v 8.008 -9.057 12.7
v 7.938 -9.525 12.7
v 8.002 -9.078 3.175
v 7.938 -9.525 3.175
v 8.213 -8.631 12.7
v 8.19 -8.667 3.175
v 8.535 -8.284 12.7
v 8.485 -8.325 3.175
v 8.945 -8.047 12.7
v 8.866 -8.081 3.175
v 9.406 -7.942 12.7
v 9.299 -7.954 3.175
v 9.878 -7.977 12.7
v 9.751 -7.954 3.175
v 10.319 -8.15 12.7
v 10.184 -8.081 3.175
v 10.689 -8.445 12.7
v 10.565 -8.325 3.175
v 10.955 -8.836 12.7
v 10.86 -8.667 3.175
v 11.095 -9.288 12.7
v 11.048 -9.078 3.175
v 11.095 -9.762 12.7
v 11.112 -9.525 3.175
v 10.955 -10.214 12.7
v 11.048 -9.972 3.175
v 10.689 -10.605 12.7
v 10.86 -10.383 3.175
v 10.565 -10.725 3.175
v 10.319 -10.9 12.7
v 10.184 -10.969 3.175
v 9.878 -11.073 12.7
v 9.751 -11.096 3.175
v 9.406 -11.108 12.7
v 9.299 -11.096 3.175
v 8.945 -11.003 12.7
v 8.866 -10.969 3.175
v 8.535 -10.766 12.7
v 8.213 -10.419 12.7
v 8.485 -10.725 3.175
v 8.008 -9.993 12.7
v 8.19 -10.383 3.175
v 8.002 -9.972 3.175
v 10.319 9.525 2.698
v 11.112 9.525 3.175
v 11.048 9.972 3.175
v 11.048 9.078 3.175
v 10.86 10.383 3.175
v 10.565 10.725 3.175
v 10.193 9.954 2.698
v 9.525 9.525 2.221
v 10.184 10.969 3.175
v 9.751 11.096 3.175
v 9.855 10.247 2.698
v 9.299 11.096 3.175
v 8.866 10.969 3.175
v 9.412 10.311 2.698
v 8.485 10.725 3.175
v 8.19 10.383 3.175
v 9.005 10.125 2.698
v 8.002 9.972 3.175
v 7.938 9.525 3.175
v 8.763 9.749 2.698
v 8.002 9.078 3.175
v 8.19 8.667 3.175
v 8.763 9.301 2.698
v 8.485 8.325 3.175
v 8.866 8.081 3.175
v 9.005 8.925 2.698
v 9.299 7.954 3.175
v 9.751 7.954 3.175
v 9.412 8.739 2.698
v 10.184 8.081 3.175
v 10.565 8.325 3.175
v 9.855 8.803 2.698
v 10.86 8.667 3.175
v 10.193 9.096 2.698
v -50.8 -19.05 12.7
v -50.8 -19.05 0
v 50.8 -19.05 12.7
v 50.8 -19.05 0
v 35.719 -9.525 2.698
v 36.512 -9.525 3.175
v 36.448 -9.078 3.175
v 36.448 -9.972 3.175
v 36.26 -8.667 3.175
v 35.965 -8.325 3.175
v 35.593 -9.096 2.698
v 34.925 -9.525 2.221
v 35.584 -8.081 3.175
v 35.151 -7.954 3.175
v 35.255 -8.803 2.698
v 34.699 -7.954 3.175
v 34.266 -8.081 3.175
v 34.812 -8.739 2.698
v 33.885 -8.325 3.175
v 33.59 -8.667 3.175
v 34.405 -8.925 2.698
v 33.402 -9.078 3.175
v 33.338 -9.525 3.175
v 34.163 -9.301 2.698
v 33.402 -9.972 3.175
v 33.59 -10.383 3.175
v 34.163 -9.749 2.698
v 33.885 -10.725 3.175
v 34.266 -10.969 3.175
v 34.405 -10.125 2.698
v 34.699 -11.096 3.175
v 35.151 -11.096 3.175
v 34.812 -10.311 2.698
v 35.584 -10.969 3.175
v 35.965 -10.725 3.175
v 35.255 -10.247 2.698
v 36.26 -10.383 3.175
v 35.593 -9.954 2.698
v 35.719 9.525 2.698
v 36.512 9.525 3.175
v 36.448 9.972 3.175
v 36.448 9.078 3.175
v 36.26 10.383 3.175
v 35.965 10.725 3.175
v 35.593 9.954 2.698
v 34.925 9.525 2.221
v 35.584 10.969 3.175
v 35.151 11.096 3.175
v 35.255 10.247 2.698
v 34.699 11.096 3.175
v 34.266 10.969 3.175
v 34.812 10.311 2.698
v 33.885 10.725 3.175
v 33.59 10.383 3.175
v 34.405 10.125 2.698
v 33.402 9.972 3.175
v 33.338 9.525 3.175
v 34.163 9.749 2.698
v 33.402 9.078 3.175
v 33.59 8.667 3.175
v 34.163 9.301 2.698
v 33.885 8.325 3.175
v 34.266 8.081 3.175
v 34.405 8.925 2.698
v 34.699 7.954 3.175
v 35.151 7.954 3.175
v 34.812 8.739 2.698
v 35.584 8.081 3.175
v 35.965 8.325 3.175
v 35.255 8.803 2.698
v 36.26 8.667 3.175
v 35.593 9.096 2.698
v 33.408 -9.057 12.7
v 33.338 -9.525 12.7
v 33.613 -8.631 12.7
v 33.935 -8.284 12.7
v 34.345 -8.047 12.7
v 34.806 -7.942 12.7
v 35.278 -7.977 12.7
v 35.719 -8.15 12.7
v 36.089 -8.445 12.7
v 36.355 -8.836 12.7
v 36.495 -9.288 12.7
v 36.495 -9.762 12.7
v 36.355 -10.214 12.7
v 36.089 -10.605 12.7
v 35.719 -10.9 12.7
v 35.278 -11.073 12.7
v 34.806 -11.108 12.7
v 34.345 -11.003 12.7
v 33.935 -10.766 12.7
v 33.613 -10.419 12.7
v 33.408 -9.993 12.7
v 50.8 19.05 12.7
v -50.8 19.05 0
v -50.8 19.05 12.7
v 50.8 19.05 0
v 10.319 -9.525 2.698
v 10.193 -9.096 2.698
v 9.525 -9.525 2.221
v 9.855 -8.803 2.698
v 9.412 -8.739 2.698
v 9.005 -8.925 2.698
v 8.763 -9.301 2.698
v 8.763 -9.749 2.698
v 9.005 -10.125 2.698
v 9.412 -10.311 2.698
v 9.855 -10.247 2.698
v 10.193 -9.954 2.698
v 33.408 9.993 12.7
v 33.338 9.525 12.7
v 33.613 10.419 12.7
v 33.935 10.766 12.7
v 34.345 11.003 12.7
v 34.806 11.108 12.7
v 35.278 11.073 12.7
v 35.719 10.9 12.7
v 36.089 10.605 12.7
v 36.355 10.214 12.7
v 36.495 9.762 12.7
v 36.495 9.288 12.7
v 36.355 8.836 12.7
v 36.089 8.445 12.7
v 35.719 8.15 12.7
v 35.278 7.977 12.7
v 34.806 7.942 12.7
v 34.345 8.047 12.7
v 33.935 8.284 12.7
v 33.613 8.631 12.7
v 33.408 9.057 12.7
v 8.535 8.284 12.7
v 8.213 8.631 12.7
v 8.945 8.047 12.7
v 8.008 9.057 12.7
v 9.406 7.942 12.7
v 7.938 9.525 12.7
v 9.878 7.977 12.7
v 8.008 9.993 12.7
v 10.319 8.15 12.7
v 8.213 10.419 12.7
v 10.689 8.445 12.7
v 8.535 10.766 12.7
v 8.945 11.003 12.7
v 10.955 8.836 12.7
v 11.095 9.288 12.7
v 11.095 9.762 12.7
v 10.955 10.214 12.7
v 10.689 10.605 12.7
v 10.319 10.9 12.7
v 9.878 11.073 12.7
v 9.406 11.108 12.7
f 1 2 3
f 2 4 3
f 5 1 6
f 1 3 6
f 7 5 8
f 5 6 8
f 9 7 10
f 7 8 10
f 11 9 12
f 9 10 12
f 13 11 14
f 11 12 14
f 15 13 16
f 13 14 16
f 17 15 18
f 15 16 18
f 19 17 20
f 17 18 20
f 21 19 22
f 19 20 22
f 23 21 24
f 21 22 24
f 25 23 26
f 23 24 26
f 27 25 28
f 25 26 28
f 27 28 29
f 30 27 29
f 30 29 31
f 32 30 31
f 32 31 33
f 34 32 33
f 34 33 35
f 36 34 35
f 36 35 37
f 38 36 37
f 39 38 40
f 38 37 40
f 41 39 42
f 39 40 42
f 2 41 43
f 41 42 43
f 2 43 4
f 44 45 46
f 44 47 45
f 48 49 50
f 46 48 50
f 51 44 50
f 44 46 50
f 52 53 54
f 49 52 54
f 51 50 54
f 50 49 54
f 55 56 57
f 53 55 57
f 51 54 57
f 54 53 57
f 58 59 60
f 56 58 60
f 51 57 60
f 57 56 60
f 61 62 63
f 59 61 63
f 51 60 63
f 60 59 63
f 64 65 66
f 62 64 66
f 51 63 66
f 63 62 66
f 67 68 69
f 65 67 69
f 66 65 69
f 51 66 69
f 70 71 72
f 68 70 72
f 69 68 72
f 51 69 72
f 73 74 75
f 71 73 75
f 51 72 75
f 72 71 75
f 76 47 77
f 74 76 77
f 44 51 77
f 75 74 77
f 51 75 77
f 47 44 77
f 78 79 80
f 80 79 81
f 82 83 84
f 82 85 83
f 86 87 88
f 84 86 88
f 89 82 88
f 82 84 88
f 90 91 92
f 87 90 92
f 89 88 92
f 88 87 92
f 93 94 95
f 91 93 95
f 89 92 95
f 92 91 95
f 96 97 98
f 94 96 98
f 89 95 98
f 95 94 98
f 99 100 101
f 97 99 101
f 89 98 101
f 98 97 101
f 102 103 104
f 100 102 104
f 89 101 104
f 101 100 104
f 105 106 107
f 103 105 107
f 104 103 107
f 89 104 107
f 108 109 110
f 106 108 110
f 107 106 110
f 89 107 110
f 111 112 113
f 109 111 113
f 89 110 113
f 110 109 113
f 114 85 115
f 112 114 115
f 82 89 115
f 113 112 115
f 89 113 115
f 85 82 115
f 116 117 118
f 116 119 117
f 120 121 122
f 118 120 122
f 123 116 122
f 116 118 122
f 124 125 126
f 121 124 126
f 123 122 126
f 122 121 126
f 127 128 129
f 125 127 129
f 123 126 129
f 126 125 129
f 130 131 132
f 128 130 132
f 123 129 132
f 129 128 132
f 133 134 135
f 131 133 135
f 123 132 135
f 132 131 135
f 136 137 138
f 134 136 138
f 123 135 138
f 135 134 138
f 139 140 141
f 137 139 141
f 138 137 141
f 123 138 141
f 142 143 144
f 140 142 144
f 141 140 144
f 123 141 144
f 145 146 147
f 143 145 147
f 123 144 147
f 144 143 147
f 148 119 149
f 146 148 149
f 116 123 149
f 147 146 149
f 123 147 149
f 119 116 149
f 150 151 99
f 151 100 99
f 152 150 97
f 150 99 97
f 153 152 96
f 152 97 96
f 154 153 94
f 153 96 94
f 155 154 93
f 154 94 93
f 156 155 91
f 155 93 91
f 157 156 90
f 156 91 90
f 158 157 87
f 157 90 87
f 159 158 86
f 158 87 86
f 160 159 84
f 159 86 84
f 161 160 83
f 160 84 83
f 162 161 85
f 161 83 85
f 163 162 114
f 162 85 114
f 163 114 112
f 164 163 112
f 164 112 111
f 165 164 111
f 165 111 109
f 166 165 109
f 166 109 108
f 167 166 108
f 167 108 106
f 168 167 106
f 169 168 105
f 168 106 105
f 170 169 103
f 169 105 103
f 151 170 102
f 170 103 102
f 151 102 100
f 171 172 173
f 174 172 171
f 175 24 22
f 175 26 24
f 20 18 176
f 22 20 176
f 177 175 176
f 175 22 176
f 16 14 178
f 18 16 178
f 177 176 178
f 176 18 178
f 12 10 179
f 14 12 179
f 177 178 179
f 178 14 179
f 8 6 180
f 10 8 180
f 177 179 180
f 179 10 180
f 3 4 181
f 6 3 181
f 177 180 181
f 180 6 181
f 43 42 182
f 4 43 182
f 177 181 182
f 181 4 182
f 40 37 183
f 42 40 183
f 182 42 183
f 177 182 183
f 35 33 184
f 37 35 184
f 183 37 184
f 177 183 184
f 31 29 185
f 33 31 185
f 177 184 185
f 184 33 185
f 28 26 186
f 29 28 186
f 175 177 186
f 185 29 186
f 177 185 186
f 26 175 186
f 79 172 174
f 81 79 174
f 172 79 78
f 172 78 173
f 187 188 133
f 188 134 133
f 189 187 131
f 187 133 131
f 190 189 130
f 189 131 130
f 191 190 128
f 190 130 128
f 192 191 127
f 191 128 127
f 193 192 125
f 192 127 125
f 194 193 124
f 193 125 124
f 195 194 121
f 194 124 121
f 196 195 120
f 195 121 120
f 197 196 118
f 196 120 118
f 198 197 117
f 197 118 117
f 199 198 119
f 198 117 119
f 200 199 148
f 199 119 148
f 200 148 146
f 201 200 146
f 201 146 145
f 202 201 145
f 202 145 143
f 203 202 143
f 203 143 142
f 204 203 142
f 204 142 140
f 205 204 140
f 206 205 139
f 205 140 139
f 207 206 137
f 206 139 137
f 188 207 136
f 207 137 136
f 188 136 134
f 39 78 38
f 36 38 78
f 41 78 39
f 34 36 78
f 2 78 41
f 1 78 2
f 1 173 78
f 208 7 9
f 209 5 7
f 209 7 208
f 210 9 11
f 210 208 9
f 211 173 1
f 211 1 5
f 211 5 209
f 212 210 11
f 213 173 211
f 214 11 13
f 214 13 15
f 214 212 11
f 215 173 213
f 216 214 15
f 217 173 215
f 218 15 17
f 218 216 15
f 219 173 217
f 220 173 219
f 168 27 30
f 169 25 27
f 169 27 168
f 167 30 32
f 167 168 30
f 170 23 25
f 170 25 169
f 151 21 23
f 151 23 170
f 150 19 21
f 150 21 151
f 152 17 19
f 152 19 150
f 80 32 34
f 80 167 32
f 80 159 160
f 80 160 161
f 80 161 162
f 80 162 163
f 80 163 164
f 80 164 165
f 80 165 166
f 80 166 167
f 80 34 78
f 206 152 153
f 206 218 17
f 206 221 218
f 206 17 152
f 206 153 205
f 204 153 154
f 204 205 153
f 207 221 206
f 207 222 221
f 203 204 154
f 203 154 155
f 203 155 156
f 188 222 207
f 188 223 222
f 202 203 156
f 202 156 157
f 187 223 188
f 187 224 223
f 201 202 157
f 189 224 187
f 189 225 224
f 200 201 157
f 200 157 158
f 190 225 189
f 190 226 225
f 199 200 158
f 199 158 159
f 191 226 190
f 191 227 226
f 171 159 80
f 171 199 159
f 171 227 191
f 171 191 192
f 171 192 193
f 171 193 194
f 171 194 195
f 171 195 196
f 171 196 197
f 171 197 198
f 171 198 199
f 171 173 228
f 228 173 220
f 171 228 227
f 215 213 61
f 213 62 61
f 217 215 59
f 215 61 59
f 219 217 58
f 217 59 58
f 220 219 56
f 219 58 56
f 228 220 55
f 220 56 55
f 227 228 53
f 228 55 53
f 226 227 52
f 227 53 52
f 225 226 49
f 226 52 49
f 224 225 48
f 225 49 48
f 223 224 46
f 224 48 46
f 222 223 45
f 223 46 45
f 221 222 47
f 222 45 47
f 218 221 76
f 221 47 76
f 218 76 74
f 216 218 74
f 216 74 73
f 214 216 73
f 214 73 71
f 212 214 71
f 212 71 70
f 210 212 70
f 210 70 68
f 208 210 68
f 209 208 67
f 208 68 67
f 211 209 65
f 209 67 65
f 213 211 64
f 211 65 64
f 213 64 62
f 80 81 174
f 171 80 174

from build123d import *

# Parameters (mm, degrees)
F0_W     = 101.6
F0_H     = 38.1
F1_DEPTH = 12.7
F3_D     = 3.175
F3_DEPTH = 9.525
F3_TIP   = 0.9538662327


with BuildPart() as f1:
    # F0 (on Top) → F1 (new body)
    with BuildSketch(Plane.XY):
        Rectangle(F0_W, F0_H)
    extrude(amount=F1_DEPTH)

    # F3
    with Locations(Plane.XY.offset(12.7)):
        with Locations((9.525, 9.525), (34.925, 9.525), (34.925, -9.525), (9.525, -9.525)):
            Hole(F3_D / 2, depth=F3_DEPTH)
            with Locations((0, 0, -(F3_DEPTH + F3_TIP / 2))):  # 118° drill point
                Cone(0, F3_D / 2, F3_TIP, mode=Mode.SUBTRACT)


solid = f1.part
